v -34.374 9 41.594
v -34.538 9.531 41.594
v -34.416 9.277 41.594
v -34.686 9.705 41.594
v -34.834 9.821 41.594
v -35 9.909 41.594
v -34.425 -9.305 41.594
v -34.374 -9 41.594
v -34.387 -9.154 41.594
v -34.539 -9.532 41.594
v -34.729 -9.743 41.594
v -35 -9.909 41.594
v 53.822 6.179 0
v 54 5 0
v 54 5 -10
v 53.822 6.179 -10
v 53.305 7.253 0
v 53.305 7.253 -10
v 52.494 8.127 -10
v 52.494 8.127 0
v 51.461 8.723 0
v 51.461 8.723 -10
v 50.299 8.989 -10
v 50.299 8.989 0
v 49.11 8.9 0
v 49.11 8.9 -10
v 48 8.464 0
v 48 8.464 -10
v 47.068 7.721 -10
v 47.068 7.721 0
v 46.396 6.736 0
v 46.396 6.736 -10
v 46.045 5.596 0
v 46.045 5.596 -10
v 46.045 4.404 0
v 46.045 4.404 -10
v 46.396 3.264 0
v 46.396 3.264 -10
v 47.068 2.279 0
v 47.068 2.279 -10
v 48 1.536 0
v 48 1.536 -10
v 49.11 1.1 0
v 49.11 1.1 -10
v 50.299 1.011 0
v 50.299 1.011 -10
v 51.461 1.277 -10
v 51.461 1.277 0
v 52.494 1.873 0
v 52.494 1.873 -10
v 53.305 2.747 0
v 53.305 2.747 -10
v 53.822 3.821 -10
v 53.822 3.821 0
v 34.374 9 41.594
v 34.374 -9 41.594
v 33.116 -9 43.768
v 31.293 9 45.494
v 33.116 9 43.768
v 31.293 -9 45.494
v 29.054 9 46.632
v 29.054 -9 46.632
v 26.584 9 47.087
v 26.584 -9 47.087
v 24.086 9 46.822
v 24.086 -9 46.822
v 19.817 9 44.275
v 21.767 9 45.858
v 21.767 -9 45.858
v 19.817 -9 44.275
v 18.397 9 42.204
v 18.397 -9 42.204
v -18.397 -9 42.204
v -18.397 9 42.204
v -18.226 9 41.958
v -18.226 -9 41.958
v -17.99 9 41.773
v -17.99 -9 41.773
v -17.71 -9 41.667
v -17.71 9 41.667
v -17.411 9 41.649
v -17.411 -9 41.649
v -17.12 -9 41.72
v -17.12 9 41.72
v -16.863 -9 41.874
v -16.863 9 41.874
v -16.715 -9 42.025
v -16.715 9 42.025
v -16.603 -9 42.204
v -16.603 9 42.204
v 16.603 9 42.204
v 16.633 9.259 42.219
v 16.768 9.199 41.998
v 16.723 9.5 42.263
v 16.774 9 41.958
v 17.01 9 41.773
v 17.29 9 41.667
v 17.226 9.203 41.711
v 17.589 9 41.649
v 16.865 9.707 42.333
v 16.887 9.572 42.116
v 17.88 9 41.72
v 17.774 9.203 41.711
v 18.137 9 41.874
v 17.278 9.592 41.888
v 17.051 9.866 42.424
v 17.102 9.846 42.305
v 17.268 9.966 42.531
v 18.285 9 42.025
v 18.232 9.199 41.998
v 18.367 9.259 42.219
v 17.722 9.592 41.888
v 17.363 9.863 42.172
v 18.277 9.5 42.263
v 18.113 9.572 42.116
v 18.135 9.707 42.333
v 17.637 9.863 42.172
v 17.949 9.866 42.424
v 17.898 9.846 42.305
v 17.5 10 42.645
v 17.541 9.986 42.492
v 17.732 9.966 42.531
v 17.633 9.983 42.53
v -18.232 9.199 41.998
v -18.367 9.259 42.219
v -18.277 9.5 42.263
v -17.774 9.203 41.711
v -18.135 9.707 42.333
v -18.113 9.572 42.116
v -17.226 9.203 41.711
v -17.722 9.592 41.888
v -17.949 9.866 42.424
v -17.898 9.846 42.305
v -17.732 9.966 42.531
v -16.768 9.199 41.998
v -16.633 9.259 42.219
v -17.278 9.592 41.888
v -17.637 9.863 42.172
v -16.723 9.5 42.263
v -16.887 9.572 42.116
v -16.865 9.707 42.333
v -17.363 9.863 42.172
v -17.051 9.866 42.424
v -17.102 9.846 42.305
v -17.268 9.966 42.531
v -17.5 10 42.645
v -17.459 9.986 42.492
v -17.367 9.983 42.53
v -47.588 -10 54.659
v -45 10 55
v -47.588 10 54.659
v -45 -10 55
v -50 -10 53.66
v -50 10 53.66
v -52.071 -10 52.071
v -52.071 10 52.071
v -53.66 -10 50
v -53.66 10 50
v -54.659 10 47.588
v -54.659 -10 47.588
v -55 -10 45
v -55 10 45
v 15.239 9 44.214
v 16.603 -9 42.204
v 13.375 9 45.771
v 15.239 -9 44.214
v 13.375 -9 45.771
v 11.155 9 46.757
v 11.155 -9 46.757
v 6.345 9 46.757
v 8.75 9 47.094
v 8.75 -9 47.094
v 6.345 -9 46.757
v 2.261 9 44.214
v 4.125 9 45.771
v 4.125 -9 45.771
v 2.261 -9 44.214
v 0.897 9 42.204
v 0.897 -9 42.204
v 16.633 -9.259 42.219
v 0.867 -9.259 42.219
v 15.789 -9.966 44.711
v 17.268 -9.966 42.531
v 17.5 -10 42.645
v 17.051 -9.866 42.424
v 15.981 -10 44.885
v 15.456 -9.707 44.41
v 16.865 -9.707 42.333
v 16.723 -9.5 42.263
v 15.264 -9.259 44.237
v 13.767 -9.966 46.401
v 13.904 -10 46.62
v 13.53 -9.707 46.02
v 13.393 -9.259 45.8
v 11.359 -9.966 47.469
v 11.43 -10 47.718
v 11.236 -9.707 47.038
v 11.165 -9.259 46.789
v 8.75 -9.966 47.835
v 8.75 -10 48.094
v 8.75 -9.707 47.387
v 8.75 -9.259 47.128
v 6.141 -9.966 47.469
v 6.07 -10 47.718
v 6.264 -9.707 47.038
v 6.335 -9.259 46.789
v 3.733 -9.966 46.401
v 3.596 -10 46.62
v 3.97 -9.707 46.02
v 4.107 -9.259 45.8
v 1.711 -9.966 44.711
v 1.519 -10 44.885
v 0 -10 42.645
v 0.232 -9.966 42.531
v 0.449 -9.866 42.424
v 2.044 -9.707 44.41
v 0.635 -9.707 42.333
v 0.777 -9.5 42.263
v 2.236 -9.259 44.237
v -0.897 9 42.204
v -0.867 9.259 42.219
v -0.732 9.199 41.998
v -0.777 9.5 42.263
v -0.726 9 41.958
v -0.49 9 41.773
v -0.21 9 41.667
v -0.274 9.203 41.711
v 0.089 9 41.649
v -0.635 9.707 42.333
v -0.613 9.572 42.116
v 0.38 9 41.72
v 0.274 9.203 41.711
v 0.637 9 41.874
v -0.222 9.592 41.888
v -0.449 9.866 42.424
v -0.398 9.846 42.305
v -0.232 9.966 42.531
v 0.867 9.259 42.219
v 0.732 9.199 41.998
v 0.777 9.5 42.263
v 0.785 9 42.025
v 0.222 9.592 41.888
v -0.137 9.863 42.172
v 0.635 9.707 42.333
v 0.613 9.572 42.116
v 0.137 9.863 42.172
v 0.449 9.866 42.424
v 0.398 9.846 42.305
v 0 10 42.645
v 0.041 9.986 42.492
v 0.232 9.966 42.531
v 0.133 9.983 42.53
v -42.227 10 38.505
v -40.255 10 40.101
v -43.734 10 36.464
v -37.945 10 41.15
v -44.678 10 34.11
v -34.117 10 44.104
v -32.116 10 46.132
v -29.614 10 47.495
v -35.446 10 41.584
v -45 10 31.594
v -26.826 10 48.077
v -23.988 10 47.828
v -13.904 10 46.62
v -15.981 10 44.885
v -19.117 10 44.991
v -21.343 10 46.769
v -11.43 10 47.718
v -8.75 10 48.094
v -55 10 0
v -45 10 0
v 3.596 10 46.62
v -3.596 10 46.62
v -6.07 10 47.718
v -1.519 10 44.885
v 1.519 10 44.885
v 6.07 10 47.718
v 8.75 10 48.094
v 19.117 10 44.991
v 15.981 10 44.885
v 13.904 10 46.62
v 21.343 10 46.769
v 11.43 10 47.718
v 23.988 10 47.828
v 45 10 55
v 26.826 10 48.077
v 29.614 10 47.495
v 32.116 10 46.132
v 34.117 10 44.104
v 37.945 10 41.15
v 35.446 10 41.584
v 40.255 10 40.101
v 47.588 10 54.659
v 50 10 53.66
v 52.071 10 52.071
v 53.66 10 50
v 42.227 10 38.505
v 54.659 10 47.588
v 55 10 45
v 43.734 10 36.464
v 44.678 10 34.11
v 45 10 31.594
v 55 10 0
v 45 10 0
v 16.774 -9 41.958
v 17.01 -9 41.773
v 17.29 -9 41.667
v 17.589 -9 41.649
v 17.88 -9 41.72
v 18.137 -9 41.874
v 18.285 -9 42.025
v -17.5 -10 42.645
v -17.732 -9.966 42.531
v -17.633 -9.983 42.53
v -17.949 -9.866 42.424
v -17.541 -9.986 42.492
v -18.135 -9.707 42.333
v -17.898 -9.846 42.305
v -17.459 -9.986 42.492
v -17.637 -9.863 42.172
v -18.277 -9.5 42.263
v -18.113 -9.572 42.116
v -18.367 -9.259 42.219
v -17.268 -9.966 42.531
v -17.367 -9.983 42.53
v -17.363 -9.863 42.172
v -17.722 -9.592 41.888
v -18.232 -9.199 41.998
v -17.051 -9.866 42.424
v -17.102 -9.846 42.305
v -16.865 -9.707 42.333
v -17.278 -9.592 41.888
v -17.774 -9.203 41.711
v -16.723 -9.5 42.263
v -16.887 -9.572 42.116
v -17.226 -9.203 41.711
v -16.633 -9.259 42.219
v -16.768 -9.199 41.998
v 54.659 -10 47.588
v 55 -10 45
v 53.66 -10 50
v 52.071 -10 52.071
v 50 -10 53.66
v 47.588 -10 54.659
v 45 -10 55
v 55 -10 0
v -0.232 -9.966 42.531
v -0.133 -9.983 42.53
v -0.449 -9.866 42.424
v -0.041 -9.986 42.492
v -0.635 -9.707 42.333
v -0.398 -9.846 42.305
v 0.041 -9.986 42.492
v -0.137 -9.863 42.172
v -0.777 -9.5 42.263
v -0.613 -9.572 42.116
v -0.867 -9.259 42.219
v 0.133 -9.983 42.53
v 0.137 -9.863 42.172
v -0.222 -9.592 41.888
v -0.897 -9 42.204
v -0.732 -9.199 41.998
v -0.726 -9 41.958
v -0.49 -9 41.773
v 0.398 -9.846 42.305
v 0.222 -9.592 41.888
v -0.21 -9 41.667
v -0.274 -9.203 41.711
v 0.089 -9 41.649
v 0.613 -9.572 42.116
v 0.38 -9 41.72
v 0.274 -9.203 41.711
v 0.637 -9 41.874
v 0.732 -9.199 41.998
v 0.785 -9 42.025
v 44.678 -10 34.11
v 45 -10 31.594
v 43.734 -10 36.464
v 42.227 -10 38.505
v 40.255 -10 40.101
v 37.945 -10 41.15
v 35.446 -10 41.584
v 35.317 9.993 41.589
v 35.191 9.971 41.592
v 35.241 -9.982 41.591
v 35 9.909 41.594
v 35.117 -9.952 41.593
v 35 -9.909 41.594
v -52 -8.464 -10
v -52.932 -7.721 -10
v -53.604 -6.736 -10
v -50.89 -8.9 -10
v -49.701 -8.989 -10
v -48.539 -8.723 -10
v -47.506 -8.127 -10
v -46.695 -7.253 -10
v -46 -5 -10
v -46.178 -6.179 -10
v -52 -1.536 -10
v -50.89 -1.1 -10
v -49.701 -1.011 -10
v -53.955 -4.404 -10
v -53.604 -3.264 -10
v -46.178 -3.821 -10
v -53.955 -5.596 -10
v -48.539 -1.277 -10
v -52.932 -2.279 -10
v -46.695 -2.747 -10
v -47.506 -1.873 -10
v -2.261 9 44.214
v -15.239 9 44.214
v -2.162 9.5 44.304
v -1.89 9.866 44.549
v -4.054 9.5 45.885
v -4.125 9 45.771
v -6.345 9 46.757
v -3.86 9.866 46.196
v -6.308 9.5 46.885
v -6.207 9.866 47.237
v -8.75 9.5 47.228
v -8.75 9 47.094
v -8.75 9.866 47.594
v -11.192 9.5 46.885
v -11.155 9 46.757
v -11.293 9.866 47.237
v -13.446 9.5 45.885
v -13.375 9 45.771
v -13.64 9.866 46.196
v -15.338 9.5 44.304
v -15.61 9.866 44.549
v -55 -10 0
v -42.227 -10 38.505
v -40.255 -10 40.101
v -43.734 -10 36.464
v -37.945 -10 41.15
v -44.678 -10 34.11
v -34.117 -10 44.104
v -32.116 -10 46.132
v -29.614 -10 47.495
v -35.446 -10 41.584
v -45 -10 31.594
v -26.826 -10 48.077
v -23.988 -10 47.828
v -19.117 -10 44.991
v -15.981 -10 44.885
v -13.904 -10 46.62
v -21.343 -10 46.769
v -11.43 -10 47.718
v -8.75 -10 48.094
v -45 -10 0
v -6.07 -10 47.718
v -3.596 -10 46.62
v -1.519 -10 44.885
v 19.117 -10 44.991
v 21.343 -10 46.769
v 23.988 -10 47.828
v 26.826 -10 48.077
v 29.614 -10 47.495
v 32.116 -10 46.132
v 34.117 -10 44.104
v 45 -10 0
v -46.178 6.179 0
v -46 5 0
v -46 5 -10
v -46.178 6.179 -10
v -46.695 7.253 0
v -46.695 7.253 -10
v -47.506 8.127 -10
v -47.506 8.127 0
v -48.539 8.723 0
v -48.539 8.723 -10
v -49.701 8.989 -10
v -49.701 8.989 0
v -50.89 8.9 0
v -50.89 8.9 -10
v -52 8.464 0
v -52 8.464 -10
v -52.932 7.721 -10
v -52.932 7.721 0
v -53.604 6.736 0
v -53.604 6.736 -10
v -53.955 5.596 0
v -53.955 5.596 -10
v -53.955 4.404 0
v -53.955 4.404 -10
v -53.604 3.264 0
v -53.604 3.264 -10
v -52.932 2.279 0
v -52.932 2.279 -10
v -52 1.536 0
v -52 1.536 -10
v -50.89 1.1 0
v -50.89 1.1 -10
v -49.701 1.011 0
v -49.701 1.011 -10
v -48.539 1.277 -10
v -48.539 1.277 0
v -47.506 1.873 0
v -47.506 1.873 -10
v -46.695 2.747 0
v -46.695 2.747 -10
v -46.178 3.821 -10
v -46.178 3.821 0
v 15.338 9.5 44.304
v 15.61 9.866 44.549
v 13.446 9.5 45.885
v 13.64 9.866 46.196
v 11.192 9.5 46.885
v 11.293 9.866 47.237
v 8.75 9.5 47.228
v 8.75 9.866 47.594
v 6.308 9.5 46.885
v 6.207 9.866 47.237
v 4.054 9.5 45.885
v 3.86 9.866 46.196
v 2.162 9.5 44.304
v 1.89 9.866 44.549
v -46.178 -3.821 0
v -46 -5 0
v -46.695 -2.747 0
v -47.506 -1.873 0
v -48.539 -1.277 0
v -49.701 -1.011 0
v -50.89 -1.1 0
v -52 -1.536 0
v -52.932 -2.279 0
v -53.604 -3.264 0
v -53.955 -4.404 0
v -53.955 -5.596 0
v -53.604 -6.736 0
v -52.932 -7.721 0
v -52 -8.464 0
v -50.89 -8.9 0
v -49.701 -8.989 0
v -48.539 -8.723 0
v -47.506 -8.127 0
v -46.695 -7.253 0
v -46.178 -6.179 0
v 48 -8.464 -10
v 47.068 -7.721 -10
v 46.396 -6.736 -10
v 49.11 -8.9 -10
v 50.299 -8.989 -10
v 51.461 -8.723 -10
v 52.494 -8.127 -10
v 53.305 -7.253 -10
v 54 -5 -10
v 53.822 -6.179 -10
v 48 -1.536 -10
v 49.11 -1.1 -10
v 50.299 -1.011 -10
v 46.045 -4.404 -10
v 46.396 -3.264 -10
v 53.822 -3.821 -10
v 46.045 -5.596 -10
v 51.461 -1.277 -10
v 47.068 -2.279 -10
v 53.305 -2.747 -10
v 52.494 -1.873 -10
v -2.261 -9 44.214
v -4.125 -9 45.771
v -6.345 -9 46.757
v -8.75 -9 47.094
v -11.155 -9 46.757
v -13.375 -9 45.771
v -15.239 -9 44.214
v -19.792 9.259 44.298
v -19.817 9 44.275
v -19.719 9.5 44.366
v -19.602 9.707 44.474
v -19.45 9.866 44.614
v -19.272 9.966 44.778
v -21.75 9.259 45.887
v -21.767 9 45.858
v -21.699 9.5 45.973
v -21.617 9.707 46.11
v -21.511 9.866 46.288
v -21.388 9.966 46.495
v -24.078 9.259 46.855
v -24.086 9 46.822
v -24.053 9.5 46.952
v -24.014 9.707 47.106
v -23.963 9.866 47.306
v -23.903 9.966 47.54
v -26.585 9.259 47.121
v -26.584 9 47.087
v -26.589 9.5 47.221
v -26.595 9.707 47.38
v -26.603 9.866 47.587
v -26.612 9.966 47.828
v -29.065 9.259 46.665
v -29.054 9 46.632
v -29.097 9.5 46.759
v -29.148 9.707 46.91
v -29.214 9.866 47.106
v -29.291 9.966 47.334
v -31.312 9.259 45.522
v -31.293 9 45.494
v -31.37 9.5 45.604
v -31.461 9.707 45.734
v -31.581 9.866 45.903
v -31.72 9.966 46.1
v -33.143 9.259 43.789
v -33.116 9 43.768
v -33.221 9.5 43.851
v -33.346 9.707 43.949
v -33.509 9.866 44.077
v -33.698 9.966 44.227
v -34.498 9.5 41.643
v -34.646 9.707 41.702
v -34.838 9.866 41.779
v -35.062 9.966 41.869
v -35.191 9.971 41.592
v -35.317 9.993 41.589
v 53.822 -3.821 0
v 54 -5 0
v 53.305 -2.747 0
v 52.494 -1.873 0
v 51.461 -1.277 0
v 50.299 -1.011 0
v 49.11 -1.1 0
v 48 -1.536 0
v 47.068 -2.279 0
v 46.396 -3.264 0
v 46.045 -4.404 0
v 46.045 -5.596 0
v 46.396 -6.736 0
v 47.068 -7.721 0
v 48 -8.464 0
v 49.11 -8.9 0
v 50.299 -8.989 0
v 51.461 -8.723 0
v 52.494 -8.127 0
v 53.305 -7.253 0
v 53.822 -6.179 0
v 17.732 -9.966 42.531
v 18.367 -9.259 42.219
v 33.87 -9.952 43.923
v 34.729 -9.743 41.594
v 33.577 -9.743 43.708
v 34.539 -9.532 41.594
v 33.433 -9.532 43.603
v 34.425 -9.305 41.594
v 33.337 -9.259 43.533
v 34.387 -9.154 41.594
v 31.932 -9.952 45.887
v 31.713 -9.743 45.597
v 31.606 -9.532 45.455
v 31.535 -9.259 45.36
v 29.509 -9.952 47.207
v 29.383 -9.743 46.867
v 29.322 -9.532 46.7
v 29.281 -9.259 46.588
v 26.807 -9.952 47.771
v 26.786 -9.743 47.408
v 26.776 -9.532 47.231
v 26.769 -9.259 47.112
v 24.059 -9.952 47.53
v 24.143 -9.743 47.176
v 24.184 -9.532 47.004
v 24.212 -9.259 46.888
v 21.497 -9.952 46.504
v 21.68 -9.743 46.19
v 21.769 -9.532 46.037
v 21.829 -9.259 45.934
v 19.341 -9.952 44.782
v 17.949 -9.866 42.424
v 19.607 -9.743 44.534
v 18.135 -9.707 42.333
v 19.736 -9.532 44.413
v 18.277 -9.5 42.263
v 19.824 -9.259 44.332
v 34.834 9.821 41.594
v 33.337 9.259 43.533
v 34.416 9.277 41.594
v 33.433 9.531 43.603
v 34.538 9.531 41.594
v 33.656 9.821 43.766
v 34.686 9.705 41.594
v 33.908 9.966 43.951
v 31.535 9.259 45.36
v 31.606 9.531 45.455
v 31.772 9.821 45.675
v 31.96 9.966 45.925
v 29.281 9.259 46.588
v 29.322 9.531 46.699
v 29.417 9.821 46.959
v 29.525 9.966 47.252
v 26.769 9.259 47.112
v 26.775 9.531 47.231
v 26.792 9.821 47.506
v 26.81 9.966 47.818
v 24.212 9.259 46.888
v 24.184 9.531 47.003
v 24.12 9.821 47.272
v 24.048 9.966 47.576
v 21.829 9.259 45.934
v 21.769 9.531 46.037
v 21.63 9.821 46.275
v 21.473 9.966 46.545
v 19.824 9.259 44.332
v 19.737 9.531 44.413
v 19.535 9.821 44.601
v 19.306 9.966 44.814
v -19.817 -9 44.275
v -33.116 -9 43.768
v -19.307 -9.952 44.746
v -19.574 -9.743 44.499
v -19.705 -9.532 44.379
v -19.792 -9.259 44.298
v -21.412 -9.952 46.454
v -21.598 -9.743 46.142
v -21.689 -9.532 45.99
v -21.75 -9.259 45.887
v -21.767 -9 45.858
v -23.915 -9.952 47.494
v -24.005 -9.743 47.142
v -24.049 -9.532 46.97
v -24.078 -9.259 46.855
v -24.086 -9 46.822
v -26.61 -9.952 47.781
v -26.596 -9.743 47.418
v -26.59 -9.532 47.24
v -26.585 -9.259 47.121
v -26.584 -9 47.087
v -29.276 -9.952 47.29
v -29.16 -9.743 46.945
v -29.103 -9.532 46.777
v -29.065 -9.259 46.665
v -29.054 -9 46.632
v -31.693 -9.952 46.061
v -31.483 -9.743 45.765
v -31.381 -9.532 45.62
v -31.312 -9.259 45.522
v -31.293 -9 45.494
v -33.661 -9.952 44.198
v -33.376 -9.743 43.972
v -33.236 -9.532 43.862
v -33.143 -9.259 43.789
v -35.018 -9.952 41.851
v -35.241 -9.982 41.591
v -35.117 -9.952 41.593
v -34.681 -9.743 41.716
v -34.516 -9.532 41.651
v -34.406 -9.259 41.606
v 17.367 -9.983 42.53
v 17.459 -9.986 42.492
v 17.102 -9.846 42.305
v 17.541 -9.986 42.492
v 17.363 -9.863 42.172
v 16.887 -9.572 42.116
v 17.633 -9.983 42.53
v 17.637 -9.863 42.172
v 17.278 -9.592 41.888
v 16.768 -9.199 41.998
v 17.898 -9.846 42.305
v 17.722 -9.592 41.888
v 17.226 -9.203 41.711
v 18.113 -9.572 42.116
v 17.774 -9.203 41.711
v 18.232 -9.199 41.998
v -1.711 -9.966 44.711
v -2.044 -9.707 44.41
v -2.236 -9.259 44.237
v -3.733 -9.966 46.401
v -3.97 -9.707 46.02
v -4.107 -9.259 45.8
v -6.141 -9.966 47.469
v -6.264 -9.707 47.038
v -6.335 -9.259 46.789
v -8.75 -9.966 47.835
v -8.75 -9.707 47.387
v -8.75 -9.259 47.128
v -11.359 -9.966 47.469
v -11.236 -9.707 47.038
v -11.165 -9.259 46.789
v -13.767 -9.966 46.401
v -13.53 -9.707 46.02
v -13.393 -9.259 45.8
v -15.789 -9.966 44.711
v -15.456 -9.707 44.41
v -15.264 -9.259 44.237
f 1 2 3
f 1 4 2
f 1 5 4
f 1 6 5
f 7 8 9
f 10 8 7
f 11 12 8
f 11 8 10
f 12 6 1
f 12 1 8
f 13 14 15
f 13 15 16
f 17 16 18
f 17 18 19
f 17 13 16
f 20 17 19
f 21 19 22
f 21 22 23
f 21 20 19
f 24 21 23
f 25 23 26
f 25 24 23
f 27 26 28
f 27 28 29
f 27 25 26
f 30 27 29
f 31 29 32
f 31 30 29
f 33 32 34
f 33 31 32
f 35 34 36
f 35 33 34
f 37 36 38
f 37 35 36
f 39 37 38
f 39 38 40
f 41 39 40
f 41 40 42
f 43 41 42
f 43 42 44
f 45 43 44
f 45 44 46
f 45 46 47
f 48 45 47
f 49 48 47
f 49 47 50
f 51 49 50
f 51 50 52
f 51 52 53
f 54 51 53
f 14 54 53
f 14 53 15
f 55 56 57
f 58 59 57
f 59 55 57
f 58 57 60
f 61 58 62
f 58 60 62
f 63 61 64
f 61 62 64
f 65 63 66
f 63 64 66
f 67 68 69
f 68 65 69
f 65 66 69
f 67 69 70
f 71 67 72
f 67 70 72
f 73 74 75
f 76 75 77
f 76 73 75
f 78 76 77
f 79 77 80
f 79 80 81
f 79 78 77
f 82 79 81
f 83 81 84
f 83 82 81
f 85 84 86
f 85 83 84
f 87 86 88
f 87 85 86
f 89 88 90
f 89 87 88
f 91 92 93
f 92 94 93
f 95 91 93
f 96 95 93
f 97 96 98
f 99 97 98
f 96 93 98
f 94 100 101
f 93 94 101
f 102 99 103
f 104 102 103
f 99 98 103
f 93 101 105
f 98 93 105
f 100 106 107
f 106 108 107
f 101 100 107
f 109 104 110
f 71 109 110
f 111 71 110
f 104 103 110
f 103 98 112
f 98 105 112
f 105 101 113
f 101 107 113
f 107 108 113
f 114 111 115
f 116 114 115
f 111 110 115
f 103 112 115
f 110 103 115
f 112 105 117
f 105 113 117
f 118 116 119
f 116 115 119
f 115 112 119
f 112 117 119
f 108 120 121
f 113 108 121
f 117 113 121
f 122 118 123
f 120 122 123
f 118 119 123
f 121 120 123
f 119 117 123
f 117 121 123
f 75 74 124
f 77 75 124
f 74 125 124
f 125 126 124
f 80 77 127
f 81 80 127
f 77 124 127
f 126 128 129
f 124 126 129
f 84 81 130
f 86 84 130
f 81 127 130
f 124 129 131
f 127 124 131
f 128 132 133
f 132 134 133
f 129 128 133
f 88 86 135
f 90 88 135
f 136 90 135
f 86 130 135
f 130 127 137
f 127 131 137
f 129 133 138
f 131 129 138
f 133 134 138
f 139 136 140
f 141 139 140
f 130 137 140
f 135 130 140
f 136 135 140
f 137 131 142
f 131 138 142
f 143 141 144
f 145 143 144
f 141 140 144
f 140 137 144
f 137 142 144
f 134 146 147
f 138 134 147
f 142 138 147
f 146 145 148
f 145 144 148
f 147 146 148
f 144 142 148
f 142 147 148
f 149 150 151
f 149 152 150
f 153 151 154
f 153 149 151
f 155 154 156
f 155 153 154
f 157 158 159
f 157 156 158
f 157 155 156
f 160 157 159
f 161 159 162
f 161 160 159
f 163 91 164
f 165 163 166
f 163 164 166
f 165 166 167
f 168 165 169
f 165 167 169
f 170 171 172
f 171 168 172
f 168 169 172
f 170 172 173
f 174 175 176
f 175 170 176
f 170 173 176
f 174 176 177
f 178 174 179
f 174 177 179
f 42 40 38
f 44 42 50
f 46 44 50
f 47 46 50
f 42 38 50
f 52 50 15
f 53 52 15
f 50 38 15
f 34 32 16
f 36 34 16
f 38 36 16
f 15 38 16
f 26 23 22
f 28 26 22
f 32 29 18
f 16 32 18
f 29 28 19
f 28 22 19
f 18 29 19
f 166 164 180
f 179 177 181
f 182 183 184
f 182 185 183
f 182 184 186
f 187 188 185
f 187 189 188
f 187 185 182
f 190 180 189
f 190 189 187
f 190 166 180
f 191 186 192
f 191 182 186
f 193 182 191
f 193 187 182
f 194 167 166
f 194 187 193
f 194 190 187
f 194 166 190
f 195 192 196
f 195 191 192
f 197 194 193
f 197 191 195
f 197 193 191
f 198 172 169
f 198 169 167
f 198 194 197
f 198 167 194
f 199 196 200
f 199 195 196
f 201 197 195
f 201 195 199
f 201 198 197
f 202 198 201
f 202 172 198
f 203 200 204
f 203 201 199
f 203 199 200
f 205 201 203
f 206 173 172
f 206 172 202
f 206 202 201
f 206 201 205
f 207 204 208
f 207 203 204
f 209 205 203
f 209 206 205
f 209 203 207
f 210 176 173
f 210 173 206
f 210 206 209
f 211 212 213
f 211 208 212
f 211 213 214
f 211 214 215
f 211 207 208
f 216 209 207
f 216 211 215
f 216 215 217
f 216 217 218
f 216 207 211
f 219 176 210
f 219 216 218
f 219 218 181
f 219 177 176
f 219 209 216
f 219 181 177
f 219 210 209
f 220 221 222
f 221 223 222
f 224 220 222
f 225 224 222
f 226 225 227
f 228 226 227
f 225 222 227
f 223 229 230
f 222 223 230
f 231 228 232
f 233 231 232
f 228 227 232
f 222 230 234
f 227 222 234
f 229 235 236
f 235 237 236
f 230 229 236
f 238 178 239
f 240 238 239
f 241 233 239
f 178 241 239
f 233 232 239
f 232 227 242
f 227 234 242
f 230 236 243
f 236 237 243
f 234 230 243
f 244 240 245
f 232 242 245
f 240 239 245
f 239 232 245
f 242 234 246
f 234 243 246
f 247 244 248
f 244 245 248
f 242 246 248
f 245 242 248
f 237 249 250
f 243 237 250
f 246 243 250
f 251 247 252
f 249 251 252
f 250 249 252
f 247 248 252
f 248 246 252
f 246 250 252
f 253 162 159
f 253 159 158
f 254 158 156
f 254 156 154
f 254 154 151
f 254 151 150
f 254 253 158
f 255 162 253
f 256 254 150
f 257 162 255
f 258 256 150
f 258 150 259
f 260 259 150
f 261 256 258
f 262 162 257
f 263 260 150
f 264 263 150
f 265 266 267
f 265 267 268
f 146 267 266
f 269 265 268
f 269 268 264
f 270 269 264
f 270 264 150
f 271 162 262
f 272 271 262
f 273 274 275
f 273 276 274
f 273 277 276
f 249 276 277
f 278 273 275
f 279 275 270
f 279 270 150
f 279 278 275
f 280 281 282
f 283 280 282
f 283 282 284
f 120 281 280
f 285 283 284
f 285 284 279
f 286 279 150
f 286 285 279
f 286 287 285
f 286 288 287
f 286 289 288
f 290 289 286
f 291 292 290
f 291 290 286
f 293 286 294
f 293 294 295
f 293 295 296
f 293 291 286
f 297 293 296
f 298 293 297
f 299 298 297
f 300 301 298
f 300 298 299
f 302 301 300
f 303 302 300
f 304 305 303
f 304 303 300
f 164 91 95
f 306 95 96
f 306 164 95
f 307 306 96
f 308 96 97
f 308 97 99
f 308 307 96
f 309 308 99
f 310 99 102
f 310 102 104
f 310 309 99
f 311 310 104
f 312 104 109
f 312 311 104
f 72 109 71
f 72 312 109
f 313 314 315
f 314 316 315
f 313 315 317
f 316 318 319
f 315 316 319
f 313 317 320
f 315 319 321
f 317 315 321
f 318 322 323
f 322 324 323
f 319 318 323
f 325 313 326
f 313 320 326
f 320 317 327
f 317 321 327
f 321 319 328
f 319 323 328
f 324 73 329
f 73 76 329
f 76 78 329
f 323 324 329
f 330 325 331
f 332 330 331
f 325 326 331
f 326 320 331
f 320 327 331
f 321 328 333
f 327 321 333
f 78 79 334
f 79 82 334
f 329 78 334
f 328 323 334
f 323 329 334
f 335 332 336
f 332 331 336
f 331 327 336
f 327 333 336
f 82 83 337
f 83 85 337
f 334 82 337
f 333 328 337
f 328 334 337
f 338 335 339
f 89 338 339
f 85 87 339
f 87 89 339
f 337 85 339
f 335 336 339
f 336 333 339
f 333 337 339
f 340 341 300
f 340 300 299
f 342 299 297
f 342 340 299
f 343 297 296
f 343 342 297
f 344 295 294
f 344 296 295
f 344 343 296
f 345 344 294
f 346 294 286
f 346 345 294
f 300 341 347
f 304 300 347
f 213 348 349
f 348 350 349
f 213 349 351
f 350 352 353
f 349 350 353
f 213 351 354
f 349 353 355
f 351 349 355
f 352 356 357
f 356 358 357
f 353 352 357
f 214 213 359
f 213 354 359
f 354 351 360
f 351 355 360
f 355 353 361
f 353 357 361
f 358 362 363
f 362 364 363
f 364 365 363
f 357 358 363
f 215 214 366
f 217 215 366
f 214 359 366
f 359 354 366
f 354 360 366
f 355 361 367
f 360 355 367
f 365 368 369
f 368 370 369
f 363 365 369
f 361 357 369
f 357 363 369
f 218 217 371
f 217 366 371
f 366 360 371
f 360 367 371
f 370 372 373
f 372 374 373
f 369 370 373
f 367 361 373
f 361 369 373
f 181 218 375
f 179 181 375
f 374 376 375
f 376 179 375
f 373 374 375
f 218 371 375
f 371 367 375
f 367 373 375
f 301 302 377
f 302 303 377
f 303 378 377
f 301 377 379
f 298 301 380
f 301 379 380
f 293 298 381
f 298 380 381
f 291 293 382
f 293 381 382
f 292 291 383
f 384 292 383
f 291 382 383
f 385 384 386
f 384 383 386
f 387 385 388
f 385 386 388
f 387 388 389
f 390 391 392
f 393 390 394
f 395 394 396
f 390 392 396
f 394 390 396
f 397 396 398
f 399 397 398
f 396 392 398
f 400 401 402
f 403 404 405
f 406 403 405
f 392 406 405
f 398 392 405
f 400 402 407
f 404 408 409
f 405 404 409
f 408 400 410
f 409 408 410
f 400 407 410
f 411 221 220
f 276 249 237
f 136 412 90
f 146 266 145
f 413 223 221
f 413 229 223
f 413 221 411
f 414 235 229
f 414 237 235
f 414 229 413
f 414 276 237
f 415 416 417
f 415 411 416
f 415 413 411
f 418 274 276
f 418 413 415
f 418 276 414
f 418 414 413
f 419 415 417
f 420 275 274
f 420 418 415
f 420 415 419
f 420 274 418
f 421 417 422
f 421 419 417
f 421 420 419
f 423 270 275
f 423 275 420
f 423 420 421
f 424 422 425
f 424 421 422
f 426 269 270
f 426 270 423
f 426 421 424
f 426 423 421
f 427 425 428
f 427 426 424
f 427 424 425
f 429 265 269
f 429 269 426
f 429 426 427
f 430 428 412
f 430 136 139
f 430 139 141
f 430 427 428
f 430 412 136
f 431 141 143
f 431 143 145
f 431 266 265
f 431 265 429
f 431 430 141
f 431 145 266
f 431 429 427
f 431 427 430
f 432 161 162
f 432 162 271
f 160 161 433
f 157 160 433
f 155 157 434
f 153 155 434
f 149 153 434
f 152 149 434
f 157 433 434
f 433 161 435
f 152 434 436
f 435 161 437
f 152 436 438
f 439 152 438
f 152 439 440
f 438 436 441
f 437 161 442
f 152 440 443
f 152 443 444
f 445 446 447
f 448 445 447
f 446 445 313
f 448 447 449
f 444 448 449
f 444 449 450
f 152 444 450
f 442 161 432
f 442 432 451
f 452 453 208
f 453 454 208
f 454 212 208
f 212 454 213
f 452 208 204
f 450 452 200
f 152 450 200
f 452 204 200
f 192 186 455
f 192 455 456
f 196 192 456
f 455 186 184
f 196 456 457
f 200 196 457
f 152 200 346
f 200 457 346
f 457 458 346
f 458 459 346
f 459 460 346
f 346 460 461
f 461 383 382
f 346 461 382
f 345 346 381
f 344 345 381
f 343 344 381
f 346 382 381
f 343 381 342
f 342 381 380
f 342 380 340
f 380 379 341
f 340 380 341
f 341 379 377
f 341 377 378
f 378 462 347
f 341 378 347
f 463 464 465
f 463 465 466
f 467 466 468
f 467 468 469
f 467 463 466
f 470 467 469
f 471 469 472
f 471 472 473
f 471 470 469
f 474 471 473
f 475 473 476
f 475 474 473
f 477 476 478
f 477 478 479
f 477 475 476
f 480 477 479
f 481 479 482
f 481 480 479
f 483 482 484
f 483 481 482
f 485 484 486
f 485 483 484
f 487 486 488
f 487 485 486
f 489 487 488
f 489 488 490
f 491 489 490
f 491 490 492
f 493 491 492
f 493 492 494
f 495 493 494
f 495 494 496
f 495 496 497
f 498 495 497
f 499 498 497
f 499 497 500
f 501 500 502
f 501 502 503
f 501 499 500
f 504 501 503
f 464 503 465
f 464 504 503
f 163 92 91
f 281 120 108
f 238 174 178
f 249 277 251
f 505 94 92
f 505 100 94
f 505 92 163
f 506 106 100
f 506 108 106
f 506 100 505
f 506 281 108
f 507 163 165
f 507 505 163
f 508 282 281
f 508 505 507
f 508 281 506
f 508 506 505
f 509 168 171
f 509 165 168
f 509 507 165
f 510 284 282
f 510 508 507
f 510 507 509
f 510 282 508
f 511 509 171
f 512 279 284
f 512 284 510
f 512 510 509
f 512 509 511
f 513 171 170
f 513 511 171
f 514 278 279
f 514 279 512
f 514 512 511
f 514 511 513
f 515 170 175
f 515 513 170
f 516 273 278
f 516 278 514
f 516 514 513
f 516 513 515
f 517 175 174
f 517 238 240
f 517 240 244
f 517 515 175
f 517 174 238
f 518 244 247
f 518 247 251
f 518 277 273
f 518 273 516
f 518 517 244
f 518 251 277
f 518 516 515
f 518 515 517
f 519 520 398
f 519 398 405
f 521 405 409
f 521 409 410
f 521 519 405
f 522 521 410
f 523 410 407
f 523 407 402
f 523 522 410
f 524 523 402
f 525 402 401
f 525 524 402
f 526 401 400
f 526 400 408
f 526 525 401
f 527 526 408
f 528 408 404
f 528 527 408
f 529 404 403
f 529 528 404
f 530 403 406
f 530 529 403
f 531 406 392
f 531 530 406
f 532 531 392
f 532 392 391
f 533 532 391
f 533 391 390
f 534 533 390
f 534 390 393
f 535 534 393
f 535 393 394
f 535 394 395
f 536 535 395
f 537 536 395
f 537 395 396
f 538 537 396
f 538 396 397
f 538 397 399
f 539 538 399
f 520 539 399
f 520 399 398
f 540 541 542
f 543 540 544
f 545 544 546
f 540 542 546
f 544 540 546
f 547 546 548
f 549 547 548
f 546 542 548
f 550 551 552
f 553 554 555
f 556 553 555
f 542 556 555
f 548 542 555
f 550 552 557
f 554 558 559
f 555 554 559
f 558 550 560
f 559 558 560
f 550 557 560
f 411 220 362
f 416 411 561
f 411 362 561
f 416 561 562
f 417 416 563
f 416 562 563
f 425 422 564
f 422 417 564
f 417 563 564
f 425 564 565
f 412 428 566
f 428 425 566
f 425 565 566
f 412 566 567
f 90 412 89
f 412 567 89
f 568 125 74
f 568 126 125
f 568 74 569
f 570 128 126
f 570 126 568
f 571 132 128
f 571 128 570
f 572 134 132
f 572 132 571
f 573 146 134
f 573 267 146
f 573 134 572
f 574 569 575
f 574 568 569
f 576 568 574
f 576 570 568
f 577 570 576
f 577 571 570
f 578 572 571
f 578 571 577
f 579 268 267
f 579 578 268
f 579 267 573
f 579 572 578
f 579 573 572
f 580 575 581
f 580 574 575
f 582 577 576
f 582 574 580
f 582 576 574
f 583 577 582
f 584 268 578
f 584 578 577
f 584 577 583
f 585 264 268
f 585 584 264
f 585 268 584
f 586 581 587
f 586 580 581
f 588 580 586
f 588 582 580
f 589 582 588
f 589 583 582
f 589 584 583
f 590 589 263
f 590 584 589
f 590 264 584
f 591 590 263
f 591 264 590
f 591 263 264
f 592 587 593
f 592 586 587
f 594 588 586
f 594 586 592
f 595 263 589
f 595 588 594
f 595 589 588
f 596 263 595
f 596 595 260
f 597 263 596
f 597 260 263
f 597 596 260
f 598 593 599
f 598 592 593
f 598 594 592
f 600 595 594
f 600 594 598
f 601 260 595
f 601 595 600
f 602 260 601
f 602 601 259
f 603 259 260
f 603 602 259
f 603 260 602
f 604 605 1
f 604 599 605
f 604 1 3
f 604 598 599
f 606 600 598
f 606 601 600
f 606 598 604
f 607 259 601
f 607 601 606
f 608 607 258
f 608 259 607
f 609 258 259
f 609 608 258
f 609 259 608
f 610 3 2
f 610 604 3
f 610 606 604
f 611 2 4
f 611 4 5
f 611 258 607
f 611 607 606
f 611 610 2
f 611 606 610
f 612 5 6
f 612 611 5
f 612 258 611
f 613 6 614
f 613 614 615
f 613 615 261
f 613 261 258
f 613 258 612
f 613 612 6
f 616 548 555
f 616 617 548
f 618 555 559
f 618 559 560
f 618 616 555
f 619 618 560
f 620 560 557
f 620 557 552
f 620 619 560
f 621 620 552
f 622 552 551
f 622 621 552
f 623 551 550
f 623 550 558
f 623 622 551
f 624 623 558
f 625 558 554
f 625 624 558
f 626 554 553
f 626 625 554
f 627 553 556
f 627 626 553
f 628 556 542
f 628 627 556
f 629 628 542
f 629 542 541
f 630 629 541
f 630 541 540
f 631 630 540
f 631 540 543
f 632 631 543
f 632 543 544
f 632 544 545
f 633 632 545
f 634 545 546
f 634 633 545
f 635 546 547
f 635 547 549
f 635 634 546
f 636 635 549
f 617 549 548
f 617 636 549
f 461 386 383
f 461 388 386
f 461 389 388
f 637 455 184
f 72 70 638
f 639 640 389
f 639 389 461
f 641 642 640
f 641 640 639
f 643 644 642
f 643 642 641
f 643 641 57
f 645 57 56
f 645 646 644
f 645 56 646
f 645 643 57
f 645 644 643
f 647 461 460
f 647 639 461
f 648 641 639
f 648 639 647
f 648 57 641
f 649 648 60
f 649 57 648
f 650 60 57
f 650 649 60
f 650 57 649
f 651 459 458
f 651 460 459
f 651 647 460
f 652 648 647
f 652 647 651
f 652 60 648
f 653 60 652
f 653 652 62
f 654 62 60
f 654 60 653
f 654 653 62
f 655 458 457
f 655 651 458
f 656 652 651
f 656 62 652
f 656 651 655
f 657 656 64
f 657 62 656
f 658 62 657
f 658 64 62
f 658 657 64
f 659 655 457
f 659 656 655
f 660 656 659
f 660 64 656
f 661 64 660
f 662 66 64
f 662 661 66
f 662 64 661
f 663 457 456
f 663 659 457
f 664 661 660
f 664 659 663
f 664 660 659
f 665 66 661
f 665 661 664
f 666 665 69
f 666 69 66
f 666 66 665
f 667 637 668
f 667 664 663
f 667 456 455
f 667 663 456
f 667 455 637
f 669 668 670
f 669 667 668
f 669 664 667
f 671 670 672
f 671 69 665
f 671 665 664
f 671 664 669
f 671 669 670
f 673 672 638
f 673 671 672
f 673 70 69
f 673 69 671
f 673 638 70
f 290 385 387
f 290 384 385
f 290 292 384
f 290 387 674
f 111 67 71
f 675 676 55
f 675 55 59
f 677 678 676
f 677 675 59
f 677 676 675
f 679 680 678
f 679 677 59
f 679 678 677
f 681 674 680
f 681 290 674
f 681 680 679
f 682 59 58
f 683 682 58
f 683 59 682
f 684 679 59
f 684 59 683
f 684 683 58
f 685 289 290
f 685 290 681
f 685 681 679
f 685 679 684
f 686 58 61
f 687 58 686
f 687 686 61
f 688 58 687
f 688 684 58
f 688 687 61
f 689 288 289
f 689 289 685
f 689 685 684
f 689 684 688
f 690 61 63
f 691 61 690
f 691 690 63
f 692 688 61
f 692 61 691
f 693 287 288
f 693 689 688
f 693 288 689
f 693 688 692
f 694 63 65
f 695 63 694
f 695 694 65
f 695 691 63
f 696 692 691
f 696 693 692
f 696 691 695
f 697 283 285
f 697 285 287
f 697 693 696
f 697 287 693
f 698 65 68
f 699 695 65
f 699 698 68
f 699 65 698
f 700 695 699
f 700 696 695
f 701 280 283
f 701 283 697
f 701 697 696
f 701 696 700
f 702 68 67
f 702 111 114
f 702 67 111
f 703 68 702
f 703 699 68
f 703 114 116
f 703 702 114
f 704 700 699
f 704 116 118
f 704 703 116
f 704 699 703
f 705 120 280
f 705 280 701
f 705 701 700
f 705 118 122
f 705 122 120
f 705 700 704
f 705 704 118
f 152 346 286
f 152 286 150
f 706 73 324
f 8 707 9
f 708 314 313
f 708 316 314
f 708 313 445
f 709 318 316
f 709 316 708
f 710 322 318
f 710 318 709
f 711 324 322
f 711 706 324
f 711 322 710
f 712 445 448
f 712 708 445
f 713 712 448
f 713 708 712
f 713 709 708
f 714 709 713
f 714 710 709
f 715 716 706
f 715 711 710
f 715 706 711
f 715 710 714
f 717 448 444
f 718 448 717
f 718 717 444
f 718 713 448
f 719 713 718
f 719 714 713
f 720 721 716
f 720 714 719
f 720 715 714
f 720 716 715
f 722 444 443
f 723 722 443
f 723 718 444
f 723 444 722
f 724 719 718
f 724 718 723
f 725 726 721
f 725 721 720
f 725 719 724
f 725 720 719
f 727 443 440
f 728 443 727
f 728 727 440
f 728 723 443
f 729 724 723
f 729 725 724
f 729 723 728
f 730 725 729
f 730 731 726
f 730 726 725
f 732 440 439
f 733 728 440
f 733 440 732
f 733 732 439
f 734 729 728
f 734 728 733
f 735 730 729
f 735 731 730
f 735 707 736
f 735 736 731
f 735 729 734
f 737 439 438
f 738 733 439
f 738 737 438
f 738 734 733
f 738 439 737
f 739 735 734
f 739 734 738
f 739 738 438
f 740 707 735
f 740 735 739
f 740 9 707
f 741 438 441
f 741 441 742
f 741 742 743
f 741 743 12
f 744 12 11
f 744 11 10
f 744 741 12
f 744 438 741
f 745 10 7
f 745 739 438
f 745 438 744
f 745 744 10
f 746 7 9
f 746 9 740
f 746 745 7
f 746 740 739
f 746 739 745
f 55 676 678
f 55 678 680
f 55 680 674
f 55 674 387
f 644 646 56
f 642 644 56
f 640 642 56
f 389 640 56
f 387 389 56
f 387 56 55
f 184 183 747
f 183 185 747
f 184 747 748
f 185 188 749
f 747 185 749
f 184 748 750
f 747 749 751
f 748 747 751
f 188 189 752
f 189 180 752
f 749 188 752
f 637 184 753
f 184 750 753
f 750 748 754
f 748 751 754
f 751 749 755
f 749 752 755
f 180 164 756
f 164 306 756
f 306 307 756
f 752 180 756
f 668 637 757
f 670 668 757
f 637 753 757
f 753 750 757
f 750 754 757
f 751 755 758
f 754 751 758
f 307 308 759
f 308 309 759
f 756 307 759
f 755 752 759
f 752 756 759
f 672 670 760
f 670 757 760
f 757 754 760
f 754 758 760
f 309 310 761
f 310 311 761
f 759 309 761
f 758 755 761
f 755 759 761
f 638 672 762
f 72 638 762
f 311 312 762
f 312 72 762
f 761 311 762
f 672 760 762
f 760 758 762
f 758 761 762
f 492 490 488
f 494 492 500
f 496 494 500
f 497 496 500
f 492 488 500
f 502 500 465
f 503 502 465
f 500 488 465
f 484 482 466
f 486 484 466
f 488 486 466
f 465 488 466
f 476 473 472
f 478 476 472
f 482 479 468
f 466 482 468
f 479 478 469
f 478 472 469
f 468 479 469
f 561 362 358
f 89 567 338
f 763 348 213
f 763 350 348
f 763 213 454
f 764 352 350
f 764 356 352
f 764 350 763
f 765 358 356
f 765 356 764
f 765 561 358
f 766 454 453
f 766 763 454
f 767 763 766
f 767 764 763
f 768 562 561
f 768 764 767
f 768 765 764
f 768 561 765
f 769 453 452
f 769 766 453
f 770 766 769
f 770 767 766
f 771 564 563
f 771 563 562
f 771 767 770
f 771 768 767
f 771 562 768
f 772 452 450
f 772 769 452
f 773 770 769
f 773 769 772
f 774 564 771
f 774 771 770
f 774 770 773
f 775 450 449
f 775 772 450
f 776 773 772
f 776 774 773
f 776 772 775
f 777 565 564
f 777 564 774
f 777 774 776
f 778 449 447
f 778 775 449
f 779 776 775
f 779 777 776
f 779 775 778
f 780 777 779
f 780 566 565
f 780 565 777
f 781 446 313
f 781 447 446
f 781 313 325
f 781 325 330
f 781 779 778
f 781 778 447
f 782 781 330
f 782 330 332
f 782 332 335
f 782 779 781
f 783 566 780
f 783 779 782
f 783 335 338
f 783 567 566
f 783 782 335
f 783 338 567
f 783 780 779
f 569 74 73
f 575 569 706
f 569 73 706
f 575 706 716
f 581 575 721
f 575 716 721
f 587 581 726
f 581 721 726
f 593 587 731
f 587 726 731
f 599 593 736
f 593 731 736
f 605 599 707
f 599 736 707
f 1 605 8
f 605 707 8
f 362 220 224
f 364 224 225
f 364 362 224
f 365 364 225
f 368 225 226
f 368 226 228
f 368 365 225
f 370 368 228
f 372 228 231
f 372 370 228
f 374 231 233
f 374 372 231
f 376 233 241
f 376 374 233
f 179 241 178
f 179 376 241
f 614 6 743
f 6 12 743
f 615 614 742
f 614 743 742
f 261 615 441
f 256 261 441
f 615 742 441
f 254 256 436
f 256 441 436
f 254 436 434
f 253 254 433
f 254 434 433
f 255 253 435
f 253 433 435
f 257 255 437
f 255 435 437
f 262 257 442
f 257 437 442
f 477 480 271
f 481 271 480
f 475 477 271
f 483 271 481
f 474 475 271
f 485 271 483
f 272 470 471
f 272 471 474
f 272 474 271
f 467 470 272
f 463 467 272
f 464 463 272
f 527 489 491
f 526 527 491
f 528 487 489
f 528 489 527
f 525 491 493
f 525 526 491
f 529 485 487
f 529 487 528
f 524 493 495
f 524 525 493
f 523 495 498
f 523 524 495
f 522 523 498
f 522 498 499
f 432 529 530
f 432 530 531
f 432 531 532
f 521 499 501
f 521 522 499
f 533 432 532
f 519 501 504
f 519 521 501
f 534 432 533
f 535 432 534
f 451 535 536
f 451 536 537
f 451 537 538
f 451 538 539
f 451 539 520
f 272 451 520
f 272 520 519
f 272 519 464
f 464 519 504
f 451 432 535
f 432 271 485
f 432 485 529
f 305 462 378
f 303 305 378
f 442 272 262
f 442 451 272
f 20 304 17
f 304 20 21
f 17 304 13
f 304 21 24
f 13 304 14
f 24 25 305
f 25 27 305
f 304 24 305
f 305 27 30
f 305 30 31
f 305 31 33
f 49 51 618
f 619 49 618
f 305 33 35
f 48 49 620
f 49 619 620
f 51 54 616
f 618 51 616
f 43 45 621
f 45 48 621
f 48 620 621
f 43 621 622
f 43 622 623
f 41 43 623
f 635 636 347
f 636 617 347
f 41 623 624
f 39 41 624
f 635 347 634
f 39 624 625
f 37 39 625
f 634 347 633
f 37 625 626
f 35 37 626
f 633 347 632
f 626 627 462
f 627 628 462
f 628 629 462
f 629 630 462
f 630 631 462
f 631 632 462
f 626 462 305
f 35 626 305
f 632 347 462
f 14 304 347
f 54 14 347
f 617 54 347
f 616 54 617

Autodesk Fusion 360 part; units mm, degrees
sketch "Sketch1" plane through (0, 0, 0) normal (0, 1, 0) x (1, 0, 0)
  line L0 (-26.25, -38.3437) -> (-55, -38.3437) construction
  arc A0 (18.3974, -42.2038) -> (34.374, -41.5937) centre (26.25, -38.3437) ccw
  arc A1 (45, -55) -> (55, -45) centre (45, -45) ccw
  line L1 (34.374, -41.5937) -> (35, -41.5937)
  arc A2 (0.8974, -42.2038) -> (-0.8974, -42.2038) centre (0, -42.6449) ccw
  arc A3 (18.3974, -42.2038) -> (16.6026, -42.2038) centre (17.5, -42.6449) ccw
  arc A4 (-34.374, -41.5937) -> (-18.3974, -42.2038) centre (-26.25, -38.3437) ccw
  arc A5 (-55, -45) -> (-45, -55) centre (-45, -45) ccw
  line L2 (-35, -29.5937) -> (35, -29.5937) construction
  line L3 (45, -45) -> (18.126, -41.5937) construction
  arc A6 (0.8974, -42.2038) -> (16.6026, -42.2038) centre (8.75, -38.3437) ccw
  line L4 (45, -55) -> (-45, -55)
  line L5 (-34.374, -41.5937) -> (-45, -45) construction
  line L6 (26.25, -38.3437) -> (55, -38.3437) construction
  arc A7 (-45, -31.5937) -> (-35, -41.5937) centre (-35, -31.5937) ccw
  line L7 (0, 0) -> (0, -57.946) construction
  arc A8 (-16.6026, -42.2038) -> (-18.3974, -42.2038) centre (-17.5, -42.6449) ccw
  arc A9 (-16.6026, -42.2038) -> (-0.8974, -42.2038) centre (-8.75, -38.3437) ccw
  arc A10 (35, -41.5937) -> (45, -31.5937) centre (35, -31.5937) ccw
  line L8 (-35, -41.5937) -> (-34.374, -41.5937)
  line L9 (-55, -45) -> (-55, 0)
  line L10 (-55, 0) -> (-45, 0)
  line L11 (-45, 0) -> (-45, -31.5937)
  line L12 (55, -45) -> (55, 0)
  line L13 (55, 0) -> (45, 0)
  line L14 (45, 0) -> (45, -31.5937)
  line L15 (55, 0) -> (-55, 0) construction
  dimension "d1" = 10
  dimension "d2" = 10
  dimension "d3" = 10
  dimension "d4" = 17.5
  dimension "d5" = 17.5
  dimension "d6" = 17.5
  dimension "d7" = 17.5
  dimension "d8" = 17.5
  dimension "d9" = 17.5
  dimension "d10" = 17.5
  dimension "d11" = 12
  dimension "d12" = 1
  dimension "d13" = 1
  dimension "d14" = 1
extrude "Extrude1" add sketch "Sketch1" along normal mid plane 20
fillet "Fillet1" radius 1 14 edges at (-26.5838, -10, 47.0874) (-17.5, -10, 41.6449) (-8.75, -10, 47.0937) (0, -10, 41.6449) (8.75, -10, 47.0937) (17.5, -10, 41.6449) (26.5838, -10, 47.0874) (26.5838, 10, 47.0874) (17.5, 10, 41.6449) (8.75, 10, 47.0937) (0, 10, 41.6449) (-8.75, 10, 47.0937) (-17.5, 10, 41.6449) (-26.5838, 10, 47.0874)
sketch "Sketch2" plane through (0, 0, 0) normal (0, 0, 1) x (1, 0, 0)
  circle A0 centre (-50, -5) radius 4
  circle A1 centre (-50, 5) radius 4
  circle A2 centre (50, -5) radius 4
  circle A3 centre (50, 5) radius 4
  dimension "d18" = 8
  dimension "d19" = 8
  dimension "d20" = 8
  dimension "d21" = 8
extrude "Extrude2" add sketch "Sketch2" against normal blind 10
